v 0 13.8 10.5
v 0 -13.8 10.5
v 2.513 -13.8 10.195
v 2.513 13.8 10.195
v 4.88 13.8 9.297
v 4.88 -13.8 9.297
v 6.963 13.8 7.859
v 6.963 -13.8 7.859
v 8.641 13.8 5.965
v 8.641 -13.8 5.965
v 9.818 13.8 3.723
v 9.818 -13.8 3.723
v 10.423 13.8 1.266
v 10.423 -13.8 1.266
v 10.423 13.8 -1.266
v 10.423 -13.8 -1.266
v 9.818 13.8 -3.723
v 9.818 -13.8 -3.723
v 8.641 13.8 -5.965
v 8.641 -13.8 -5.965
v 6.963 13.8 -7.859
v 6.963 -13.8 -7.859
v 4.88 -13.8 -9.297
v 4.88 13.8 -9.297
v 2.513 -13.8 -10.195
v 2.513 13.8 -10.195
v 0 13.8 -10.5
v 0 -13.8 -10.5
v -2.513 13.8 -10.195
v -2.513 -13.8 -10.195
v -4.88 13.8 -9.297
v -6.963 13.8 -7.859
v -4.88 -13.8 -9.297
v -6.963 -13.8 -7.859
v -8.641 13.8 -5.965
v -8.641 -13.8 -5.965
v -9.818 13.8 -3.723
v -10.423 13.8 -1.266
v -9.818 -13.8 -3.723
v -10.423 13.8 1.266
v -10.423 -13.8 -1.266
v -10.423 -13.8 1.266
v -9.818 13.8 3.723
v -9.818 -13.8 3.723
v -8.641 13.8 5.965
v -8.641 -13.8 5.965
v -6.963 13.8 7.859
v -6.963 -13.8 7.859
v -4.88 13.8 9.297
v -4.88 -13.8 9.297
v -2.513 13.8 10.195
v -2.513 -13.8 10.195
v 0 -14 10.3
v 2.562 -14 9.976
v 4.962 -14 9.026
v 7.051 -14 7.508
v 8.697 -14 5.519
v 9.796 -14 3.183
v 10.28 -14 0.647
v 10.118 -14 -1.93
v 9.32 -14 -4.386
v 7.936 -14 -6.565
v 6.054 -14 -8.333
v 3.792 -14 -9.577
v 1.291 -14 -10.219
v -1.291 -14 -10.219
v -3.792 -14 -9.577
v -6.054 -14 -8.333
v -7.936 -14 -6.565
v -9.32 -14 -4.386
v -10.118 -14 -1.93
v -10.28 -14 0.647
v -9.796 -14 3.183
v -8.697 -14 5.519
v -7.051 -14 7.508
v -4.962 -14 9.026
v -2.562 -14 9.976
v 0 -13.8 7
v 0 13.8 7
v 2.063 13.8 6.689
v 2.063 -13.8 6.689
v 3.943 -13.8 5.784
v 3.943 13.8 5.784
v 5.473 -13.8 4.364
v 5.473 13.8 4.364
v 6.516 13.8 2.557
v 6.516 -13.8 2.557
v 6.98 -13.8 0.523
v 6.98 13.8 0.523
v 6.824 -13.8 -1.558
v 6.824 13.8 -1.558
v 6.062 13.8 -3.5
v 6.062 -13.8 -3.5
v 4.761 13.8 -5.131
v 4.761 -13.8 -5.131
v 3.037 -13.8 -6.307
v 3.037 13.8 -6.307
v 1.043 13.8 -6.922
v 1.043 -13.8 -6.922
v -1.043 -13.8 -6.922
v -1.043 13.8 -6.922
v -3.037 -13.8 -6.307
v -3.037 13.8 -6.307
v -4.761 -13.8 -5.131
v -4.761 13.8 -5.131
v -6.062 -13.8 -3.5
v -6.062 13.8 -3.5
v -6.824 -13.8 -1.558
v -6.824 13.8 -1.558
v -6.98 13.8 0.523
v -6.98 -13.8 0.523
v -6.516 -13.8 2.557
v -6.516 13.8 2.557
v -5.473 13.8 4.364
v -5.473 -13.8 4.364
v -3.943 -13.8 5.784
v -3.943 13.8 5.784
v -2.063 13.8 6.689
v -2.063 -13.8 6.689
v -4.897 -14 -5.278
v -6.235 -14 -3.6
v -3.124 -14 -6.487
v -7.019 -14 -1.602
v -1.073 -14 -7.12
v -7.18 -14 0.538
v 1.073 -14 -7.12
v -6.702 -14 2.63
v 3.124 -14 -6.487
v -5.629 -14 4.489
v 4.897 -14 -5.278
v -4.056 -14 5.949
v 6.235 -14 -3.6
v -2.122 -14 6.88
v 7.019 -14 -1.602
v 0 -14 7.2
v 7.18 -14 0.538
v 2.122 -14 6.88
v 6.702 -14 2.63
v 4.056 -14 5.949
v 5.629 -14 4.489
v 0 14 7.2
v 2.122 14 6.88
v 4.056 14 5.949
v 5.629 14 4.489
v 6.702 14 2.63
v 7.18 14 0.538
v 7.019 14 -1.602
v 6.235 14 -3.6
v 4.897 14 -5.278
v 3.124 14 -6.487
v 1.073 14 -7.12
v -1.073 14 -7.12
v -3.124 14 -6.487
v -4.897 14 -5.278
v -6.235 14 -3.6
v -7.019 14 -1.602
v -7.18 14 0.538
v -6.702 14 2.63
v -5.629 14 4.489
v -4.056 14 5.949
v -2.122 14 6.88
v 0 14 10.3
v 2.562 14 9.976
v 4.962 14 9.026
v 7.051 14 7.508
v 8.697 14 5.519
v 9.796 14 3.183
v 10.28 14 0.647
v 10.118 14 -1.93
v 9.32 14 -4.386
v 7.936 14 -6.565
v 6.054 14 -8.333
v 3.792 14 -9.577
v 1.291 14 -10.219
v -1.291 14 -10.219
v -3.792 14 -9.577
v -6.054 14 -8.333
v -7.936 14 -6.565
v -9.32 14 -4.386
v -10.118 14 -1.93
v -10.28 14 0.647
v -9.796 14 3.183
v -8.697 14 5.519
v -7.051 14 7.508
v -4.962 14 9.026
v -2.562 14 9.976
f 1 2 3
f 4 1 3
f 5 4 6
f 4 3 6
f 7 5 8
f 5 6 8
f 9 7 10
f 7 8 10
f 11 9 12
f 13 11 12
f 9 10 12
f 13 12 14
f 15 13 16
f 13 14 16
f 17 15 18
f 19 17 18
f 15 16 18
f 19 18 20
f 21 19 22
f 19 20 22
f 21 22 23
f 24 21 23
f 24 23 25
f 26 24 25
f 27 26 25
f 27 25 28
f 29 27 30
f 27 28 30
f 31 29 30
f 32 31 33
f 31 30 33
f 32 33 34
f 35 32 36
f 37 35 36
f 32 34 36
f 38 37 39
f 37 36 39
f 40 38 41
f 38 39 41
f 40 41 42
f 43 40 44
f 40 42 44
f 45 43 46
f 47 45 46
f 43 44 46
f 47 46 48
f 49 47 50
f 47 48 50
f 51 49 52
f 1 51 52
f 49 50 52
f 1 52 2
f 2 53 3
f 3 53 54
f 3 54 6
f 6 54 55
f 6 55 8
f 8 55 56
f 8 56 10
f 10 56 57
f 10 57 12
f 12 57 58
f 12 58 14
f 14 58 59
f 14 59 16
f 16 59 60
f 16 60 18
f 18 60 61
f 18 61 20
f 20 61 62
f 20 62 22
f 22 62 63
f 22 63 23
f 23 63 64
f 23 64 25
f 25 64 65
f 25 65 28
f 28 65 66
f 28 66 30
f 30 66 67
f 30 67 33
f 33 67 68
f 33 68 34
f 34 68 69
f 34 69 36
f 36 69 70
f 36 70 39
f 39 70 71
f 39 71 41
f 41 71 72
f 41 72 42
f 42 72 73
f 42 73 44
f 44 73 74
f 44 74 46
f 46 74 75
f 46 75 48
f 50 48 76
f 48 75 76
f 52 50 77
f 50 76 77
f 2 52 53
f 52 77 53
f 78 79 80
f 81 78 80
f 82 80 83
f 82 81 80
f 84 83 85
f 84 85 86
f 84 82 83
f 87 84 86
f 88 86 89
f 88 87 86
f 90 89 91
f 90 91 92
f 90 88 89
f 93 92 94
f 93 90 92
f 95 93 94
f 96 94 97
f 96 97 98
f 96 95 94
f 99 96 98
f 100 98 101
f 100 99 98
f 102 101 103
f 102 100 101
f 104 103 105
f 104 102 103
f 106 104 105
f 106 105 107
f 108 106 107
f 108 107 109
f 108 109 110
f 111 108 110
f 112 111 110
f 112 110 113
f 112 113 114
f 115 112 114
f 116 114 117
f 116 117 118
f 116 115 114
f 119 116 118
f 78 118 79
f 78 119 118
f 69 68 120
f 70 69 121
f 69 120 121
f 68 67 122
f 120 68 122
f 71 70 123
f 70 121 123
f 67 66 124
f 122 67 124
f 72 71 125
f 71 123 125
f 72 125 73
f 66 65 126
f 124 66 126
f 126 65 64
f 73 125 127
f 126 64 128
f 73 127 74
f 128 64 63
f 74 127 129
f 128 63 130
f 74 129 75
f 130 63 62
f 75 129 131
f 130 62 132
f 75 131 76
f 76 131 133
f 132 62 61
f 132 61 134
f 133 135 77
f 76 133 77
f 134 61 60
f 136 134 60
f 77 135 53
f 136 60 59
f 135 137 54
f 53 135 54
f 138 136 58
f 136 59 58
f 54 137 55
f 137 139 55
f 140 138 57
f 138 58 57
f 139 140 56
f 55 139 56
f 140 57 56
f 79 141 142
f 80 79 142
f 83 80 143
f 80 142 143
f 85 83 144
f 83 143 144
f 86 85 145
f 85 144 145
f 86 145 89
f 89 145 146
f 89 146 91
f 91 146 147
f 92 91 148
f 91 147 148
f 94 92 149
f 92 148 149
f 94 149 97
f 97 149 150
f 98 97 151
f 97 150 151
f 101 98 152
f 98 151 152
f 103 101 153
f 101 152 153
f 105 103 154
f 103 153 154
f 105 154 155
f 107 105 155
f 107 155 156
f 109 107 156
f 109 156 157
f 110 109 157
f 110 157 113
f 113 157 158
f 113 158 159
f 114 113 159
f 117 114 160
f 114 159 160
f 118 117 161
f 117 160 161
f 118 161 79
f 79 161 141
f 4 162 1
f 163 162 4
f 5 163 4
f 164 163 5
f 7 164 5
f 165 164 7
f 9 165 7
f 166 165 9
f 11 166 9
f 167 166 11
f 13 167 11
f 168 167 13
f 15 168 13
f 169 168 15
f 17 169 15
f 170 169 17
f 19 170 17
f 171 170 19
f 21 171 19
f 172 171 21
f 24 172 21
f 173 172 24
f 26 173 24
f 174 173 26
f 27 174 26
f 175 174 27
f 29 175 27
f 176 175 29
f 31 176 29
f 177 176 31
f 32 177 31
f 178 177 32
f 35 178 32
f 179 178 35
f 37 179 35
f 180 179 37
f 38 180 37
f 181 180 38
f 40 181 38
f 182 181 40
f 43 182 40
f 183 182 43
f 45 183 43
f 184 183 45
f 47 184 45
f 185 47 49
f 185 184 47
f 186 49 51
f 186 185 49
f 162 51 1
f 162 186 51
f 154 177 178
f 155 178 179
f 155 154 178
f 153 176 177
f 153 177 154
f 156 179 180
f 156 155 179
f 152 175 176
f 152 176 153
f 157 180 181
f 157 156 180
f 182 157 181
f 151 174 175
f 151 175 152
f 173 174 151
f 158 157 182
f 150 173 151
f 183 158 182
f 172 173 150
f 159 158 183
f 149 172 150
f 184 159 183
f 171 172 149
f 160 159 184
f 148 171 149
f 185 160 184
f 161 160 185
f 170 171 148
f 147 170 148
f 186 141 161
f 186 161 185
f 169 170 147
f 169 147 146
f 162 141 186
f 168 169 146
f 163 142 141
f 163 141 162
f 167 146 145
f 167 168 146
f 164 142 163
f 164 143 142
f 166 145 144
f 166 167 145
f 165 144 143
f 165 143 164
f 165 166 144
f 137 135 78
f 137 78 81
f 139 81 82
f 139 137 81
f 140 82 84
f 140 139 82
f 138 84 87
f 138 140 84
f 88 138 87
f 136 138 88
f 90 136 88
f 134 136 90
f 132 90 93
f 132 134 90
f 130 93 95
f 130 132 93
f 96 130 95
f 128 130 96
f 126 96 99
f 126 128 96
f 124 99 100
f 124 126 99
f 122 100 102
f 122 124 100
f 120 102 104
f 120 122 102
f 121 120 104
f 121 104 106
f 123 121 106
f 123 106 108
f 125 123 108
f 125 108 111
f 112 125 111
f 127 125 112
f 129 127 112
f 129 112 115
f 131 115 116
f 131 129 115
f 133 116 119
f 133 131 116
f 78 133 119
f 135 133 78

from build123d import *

# Parameters (mm, degrees)
AUFSATZ_LINEAR_AUSTRAGEN1_DEPTH      = 14
AUFSATZ_LINEAR_AUSTRAGEN1_DEPTH_BACK = 14
SKIZZE1_R                            = 10.5
SKIZZE1_R_2                          = 7
FASE1_SIZE                           = 0.2


with BuildPart() as part:
    # Skizze1 → Aufsatz-Linear austragen1 (new, two sides: drawn at the far end of the back side and taken through both)
    with BuildSketch(Plane(origin=(0, 0, 0), x_dir=(1, 0, 0), z_dir=(0, 1, 0)).offset(-AUFSATZ_LINEAR_AUSTRAGEN1_DEPTH_BACK)):
        Circle(SKIZZE1_R)
        Circle(SKIZZE1_R_2, mode=Mode.SUBTRACT)
    extrude(amount=AUFSATZ_LINEAR_AUSTRAGEN1_DEPTH + AUFSATZ_LINEAR_AUSTRAGEN1_DEPTH_BACK)

    # Fase1
    fase1_edges = [part.edges().sort_by_distance(p)[0] for p in [
        (-7, -14, 0),
        (-10.5, -14, 0),
        (-10.5, 14, 0),
        (-7, 14, 0),
    ]]
    chamfer(fase1_edges, length=FASE1_SIZE)


solid = part.part
